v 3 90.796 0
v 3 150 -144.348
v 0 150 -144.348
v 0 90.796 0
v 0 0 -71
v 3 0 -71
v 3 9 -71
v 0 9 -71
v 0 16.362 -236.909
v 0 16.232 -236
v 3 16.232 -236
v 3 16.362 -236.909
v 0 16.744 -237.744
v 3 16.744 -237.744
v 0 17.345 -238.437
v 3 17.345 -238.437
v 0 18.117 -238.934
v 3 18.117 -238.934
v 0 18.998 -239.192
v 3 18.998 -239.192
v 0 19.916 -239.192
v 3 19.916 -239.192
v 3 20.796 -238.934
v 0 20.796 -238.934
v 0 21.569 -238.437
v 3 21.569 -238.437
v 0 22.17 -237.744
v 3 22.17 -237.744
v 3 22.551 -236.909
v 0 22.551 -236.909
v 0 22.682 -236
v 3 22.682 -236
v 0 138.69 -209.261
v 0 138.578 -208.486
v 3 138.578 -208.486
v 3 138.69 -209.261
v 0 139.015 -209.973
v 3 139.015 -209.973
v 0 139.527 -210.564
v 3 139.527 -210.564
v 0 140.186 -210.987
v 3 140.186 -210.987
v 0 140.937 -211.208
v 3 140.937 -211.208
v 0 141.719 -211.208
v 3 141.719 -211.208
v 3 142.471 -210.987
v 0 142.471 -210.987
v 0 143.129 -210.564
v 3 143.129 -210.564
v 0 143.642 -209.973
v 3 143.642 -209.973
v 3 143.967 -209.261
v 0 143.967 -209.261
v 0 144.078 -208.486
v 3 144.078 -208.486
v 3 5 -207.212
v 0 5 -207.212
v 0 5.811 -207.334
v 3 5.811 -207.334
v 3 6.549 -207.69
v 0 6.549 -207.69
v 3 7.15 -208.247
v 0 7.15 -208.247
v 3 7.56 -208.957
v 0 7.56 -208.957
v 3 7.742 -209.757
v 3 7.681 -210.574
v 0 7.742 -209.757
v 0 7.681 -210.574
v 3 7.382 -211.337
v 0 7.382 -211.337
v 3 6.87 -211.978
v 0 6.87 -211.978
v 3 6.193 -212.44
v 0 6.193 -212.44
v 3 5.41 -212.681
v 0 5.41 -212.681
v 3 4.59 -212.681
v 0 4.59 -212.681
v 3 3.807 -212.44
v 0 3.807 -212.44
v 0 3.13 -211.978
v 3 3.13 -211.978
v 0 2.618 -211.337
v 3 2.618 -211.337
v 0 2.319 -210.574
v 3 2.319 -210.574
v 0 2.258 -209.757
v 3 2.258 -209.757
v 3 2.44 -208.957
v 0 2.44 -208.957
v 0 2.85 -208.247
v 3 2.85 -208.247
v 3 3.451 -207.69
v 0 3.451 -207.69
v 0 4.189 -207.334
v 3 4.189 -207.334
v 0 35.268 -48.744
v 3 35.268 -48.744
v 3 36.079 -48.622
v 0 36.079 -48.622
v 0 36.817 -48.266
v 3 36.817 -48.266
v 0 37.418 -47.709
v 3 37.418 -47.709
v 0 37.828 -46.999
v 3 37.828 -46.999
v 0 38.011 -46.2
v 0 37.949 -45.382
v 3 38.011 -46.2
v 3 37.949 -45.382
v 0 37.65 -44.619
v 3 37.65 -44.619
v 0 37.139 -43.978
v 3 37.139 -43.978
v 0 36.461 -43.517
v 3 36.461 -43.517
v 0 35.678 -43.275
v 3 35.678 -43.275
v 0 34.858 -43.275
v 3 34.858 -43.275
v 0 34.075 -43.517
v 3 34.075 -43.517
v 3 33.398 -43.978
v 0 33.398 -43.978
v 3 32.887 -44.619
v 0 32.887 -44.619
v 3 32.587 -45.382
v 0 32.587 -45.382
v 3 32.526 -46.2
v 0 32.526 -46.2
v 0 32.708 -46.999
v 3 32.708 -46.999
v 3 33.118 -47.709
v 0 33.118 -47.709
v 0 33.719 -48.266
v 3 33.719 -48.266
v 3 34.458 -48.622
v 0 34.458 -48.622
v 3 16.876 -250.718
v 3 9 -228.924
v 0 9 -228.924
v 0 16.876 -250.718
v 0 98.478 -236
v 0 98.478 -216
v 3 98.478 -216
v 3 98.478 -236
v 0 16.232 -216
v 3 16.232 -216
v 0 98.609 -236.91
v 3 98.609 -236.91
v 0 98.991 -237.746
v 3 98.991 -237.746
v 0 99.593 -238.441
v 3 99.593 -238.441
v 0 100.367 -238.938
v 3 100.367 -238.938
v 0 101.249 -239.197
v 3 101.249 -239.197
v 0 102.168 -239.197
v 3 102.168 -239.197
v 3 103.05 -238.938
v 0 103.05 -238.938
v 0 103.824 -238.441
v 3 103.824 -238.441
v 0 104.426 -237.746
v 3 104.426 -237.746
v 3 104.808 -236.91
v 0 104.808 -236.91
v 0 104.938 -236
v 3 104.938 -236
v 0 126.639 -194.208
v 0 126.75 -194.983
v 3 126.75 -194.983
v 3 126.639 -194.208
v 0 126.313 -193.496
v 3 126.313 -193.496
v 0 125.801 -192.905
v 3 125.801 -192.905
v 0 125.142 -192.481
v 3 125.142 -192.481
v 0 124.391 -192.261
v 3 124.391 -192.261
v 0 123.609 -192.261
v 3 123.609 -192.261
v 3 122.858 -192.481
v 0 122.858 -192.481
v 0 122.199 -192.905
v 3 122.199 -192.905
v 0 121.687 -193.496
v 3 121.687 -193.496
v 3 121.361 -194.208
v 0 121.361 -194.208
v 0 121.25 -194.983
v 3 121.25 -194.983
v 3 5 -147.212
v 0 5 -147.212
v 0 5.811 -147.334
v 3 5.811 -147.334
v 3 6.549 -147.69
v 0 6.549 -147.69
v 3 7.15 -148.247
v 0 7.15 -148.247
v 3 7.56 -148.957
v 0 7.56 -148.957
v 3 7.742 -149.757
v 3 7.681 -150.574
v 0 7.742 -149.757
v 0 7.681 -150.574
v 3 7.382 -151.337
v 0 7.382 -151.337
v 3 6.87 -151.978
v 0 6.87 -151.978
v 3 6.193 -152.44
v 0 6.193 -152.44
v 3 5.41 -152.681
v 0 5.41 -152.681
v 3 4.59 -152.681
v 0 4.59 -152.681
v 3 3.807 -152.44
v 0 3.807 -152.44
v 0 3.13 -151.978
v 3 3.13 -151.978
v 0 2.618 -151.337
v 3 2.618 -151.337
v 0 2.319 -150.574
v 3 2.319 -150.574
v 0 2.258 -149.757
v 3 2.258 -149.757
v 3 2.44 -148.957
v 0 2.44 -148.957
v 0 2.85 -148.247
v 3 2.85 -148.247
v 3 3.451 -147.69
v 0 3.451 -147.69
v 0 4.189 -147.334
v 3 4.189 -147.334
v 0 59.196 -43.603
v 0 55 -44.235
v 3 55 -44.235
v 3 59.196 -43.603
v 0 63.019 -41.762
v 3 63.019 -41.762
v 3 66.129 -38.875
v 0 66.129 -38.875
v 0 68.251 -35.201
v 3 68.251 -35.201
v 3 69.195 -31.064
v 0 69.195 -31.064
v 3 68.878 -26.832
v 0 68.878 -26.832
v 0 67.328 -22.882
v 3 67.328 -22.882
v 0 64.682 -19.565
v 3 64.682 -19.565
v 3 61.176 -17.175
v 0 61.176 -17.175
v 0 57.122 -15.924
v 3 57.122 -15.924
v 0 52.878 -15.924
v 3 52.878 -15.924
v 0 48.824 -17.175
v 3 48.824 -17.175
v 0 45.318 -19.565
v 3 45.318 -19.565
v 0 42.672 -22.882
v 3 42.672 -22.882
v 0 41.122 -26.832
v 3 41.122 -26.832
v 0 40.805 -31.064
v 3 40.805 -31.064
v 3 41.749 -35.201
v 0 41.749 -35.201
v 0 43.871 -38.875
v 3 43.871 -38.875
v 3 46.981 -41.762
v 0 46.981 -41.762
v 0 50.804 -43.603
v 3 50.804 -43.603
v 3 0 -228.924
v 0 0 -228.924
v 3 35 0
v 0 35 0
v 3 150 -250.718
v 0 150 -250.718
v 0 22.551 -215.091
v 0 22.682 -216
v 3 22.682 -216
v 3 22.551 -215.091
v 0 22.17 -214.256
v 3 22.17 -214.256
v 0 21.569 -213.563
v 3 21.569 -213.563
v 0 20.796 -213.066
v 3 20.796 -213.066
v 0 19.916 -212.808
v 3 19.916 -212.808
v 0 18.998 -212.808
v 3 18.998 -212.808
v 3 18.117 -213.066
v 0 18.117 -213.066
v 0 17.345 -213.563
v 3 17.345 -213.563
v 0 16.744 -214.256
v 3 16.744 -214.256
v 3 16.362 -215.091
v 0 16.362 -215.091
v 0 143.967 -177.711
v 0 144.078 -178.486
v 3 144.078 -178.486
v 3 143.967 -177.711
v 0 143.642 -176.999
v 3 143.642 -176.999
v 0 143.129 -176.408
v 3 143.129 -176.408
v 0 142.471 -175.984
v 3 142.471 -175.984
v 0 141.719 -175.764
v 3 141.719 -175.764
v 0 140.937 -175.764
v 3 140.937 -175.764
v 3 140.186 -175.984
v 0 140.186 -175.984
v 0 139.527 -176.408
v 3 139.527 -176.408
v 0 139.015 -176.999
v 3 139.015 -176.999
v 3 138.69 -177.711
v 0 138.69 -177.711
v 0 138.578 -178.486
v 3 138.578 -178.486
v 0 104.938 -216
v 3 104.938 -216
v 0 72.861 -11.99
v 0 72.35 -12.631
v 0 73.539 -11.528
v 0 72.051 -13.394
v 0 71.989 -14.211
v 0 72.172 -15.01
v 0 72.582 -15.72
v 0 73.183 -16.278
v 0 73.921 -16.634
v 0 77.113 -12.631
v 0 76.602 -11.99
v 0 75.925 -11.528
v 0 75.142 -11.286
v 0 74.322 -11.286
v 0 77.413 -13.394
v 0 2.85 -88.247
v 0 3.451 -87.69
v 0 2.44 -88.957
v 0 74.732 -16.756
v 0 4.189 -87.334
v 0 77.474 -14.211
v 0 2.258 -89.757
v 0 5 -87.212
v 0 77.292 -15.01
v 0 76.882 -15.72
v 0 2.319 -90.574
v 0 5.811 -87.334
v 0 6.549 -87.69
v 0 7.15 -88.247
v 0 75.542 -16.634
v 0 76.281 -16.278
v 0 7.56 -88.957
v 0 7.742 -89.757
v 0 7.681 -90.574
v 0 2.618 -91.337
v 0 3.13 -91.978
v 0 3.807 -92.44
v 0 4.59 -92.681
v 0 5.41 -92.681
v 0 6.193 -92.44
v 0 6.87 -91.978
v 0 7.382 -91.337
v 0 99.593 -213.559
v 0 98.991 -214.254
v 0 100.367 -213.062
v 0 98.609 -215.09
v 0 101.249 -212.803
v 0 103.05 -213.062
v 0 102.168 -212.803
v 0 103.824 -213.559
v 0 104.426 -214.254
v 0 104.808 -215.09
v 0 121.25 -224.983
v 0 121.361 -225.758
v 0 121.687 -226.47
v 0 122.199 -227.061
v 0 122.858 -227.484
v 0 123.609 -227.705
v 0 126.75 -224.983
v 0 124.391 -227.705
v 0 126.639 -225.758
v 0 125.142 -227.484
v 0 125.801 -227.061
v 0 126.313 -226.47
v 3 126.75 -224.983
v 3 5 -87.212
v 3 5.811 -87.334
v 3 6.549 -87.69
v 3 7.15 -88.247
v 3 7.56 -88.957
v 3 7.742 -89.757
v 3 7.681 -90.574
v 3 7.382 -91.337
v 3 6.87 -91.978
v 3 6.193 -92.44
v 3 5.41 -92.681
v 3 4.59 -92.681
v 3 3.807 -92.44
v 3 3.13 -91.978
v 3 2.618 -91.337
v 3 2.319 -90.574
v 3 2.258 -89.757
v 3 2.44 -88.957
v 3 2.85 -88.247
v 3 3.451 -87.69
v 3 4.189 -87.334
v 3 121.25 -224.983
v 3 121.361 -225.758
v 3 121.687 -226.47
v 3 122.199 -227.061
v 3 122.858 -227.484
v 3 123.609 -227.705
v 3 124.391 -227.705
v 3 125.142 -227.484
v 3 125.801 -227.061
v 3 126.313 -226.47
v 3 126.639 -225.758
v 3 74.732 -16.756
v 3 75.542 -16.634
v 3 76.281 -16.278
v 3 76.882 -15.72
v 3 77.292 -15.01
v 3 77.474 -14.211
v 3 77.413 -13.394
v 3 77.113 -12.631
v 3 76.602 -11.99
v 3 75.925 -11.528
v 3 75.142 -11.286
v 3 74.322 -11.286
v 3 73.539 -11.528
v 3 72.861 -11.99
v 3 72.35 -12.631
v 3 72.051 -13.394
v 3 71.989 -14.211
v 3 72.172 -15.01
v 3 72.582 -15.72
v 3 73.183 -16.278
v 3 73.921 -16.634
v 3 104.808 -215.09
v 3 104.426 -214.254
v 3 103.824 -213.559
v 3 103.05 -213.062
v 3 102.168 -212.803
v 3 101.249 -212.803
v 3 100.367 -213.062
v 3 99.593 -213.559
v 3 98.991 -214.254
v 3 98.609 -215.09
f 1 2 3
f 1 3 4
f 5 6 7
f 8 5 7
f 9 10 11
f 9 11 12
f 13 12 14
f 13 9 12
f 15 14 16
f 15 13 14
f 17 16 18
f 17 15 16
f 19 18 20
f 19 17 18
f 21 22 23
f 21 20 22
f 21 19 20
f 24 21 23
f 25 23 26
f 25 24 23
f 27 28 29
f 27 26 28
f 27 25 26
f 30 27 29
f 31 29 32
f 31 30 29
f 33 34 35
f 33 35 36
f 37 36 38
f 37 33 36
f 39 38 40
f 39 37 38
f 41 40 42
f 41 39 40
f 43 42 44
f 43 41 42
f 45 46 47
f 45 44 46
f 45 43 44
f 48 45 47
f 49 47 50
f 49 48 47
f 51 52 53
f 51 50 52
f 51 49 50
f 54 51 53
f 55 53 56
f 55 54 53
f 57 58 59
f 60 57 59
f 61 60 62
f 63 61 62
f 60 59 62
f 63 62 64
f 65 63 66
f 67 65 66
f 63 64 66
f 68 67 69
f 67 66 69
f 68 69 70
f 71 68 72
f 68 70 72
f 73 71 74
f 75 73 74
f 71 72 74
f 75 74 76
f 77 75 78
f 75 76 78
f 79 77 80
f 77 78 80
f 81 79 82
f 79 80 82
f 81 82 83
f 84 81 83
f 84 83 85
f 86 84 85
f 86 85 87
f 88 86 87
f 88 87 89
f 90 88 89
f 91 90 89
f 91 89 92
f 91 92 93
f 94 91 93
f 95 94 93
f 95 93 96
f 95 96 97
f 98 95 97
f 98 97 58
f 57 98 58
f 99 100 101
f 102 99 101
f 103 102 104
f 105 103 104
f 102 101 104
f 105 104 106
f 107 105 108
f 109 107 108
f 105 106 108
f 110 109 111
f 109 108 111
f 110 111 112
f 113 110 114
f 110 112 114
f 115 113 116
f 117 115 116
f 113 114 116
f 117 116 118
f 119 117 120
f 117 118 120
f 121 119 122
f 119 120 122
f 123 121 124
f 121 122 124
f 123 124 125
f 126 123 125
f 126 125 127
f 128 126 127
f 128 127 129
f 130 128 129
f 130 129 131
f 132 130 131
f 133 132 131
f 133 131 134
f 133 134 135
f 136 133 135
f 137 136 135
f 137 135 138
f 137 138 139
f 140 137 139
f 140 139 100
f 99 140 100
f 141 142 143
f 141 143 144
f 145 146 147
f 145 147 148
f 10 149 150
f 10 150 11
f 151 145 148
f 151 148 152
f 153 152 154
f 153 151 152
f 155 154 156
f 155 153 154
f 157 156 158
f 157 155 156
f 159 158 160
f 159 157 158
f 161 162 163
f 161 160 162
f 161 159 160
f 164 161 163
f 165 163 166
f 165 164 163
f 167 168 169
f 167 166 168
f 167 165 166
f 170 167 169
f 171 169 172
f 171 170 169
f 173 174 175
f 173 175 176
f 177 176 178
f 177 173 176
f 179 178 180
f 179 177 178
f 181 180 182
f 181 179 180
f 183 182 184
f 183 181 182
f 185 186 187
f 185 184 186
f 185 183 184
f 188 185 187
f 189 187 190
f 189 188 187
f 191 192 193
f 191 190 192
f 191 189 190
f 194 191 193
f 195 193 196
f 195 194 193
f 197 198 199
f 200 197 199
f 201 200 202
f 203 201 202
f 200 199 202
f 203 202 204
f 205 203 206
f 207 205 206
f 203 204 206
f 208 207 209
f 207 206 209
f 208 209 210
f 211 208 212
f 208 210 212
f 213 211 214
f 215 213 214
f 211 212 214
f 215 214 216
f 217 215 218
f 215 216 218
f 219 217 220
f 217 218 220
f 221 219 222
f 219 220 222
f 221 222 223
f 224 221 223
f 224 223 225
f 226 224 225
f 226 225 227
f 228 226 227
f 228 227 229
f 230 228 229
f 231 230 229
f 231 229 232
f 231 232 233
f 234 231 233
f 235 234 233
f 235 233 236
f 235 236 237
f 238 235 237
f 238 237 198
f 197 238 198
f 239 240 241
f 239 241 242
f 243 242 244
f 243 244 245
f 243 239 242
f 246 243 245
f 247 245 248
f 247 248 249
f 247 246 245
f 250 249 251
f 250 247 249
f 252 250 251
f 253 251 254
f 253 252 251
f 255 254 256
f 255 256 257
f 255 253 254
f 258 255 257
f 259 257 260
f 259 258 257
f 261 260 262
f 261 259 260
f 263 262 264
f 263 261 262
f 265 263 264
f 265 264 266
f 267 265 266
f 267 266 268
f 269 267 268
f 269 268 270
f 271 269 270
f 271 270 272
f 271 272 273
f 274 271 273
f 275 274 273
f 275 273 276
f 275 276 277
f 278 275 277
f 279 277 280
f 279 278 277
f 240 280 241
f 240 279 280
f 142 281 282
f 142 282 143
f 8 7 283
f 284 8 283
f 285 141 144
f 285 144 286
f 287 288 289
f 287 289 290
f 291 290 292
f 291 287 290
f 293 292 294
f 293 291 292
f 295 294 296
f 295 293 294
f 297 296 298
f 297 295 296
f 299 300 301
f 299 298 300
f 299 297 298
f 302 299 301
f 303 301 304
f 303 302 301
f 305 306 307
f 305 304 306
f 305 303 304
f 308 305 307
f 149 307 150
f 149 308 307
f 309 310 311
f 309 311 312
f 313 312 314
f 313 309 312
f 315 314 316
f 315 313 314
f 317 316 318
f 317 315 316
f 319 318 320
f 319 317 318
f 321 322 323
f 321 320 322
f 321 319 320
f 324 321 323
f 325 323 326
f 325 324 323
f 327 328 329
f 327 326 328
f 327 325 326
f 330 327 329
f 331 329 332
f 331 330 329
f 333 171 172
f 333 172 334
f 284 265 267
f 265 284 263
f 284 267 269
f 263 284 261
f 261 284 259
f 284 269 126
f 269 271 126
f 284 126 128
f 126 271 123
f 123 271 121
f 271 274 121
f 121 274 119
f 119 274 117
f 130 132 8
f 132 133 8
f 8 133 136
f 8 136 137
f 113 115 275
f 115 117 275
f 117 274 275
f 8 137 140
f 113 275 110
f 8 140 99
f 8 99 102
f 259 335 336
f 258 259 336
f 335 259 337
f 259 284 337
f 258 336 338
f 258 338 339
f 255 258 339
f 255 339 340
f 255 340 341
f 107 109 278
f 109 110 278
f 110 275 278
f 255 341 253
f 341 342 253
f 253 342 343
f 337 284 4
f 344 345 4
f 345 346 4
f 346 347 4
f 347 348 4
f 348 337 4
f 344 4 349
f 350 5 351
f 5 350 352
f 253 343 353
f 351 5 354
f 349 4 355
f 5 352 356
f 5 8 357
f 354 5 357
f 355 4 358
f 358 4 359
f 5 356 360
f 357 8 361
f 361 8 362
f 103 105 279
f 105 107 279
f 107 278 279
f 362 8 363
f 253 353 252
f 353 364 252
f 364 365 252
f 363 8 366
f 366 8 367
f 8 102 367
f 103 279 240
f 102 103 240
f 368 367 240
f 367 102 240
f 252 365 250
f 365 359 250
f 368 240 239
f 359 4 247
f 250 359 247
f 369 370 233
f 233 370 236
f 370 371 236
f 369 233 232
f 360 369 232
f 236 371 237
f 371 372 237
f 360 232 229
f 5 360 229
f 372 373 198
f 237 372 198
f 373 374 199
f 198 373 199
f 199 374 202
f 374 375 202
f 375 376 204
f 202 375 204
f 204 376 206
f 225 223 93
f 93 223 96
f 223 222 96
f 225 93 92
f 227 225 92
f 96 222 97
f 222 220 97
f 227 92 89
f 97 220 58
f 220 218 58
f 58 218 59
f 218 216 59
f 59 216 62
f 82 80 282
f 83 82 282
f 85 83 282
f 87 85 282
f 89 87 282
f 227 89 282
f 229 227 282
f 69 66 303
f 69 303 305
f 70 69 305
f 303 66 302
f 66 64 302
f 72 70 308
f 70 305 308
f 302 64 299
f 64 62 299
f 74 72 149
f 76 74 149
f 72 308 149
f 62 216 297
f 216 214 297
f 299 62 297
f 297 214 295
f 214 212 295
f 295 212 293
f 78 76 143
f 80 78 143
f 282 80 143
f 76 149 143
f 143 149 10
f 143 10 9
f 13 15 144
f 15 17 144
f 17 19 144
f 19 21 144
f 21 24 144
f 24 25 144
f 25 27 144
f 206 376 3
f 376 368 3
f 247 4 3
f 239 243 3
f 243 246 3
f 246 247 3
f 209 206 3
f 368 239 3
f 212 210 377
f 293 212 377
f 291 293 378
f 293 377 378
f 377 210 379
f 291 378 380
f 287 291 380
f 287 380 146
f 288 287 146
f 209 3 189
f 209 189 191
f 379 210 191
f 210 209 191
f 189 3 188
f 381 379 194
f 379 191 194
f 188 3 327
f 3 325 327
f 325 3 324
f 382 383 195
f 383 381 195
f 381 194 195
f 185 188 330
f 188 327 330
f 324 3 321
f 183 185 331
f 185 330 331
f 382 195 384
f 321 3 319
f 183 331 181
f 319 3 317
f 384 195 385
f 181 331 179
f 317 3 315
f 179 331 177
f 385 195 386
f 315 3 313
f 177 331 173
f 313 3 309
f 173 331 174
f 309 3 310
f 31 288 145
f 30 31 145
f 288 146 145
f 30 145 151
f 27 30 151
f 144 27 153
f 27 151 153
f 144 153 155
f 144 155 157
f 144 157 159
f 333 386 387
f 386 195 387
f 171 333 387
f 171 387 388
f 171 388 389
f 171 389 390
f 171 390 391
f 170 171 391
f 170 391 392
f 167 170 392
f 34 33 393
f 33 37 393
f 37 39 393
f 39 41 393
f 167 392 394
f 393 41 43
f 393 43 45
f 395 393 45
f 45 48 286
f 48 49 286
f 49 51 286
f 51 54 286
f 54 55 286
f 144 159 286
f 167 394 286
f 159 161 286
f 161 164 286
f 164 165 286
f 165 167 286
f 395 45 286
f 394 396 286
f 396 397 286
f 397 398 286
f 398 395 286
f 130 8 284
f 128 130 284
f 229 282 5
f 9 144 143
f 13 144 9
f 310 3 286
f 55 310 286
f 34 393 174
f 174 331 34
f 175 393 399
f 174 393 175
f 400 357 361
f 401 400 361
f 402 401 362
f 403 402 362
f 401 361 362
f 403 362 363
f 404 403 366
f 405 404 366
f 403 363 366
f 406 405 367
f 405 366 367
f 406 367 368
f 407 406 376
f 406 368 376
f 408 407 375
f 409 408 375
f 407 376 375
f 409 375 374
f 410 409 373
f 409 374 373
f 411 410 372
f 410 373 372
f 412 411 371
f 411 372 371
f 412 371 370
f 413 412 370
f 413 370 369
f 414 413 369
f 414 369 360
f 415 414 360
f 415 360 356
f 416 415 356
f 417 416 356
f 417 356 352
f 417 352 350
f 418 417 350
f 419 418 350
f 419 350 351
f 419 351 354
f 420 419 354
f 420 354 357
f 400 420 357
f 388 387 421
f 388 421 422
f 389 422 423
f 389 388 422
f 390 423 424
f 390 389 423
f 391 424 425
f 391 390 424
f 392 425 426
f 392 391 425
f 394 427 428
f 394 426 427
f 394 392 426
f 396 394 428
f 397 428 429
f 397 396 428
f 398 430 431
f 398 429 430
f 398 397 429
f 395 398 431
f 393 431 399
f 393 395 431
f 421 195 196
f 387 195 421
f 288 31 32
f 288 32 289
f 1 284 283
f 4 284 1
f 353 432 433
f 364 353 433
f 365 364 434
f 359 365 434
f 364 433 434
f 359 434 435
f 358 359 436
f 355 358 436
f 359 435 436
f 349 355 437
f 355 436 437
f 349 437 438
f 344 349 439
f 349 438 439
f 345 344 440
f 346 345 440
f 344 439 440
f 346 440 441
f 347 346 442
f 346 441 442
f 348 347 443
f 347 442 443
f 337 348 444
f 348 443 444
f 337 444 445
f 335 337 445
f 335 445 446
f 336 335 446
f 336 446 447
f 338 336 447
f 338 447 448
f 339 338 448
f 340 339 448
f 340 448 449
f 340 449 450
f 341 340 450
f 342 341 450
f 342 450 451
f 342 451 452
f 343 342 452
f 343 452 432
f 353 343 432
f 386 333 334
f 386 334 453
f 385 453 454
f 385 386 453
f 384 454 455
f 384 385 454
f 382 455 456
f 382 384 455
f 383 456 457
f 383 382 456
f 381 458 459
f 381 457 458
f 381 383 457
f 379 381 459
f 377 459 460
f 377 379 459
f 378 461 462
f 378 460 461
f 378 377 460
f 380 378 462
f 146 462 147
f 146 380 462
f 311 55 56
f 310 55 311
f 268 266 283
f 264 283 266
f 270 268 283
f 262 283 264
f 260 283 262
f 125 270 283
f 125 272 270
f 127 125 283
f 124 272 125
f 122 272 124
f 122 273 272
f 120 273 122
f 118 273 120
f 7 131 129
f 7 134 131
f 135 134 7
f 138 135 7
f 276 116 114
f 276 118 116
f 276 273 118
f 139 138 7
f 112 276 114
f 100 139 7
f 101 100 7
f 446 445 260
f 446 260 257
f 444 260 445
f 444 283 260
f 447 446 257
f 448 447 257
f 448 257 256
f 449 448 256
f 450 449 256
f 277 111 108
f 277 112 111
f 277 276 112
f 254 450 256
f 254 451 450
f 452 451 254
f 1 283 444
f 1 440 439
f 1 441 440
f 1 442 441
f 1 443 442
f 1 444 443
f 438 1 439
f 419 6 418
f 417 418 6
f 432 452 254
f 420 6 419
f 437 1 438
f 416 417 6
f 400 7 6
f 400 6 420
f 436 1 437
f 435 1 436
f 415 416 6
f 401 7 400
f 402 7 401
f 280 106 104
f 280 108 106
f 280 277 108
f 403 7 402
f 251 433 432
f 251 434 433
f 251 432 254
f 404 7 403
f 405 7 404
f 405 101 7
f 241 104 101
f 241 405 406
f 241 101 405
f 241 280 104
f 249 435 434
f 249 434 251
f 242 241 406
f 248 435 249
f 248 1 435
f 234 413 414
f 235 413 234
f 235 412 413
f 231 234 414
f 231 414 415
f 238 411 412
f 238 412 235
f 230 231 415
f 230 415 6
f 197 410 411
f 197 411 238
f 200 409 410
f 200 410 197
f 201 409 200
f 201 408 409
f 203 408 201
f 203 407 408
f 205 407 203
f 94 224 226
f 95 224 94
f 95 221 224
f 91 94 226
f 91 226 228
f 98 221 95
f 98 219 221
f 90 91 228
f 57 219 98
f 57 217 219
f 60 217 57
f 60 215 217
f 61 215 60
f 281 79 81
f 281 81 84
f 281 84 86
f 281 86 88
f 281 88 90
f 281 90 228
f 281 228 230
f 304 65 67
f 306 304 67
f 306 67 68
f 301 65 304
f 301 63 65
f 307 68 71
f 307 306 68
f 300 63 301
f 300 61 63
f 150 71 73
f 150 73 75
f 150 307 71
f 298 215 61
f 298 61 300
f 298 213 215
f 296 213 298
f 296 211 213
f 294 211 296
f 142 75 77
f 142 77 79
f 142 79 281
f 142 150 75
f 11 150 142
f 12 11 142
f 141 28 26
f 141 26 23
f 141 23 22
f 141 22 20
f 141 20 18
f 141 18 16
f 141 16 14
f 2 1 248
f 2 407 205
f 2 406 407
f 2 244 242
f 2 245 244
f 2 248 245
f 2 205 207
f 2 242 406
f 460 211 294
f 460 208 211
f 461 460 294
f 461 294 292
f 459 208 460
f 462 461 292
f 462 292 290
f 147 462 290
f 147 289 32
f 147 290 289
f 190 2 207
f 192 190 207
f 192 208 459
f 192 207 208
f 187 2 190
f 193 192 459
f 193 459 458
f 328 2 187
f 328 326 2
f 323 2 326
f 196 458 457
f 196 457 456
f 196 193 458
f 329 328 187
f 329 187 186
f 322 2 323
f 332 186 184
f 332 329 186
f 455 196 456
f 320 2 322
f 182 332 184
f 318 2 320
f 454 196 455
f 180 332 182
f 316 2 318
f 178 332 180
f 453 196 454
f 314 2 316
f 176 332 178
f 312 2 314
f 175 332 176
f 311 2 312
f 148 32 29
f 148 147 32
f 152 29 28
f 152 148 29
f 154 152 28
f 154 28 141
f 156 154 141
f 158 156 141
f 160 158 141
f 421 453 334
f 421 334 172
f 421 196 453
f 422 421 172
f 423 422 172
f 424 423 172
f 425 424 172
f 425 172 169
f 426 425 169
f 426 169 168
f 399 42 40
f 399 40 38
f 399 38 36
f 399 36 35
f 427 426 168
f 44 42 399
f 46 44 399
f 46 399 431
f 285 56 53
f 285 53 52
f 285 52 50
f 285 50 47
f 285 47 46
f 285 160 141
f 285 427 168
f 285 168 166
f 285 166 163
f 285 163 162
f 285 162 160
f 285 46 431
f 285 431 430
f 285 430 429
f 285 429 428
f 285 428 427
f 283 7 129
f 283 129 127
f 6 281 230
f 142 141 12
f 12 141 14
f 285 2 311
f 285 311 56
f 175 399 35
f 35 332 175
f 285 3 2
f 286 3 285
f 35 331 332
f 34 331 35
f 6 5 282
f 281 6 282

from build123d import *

# Parameters (mm, degrees)
SKETCH1_W           = 300
SKETCH1_H           = 150
SKETCH1_R           = 14.235
BOSS_EXTRUDE1_DEPTH = 3
CUT_EXTRUDE1_REACH  = 5
SKETCH2_R           = 3.225
SKETCH3_R           = 2.75
CUT_EXTRUDE2_DEPTH  = 4
CUT_EXTRUDE3_DEPTH  = 4
CUT_EXTRUDE4_DEPTH  = 10
CUT_EXTRUDE5_DEPTH  = 10
SKETCH7_R           = 2.75
CUT_EXTRUDE6_DEPTH  = 4
CUT_EXTRUDE7_DEPTH  = 10


with BuildPart() as part:
    # Sketch1 → Boss-Extrude1 (new body)
    with BuildSketch(Plane(origin=(0, 0, 0), x_dir=(0, 0, -1), z_dir=(1, 0, 0))):
        with Locations((150, 75)):
            Rectangle(SKETCH1_W, SKETCH1_H)
        with Locations((30, 55)):
            Circle(SKETCH1_R, mode=Mode.SUBTRACT)
    extrude(amount=BOSS_EXTRUDE1_DEPTH)

    # Sketch2 → Cut-Extrude1 (cut, up to next)
    with BuildSketch(Plane.ZY, mode=Mode.PRIVATE) as cut_extrude1_sk1:
        with Locations((-10, 110)):
            Circle(SKETCH2_R)
    cut_extrude1_tool1 = extrude(cut_extrude1_sk1.sketch, amount=-CUT_EXTRUDE1_REACH, mode=Mode.PRIVATE) & part.part
    add(cut_extrude1_tool1.solids().sort_by_distance((0, 110, -10))[0], mode=Mode.SUBTRACT)
    # Sketch2 → Cut-Extrude1 (cut, up to next)
    with BuildSketch(Plane.ZY, mode=Mode.PRIVATE) as cut_extrude1_sk2:
        with BuildLine():
            Line((-216, 98.478413591), (-236, 98.478413591))
            ThreePointArc((-236, 98.478413591), (-239.23, 101.708413591), (-236, 104.938413591))
            Line((-236, 104.938413591), (-216, 104.938413591))
            ThreePointArc((-216, 104.938413591), (-212.77, 101.708413591), (-216, 98.478413591))
        make_face()
    cut_extrude1_tool2 = extrude(cut_extrude1_sk2.sketch, amount=-CUT_EXTRUDE1_REACH, mode=Mode.PRIVATE) & part.part
    add(cut_extrude1_tool2.solids().sort_by_distance((0, 101.708414, -226))[0], mode=Mode.SUBTRACT)
    # Sketch2 → Cut-Extrude1 (cut, up to next)
    with BuildSketch(Plane.ZY, mode=Mode.PRIVATE) as cut_extrude1_sk3:
        with BuildLine():
            Line((-236, 22.681694356), (-216, 22.681694356))
            ThreePointArc((-216, 22.681694356), (-212.775, 19.456694356), (-216, 16.231694356))
            Line((-216, 16.231694356), (-236, 16.231694356))
            ThreePointArc((-236, 16.231694356), (-239.225, 19.456694356), (-236, 22.681694356))
        make_face()
    cut_extrude1_tool3 = extrude(cut_extrude1_sk3.sketch, amount=-CUT_EXTRUDE1_REACH, mode=Mode.PRIVATE) & part.part
    add(cut_extrude1_tool3.solids().sort_by_distance((0, 19.456694, -226))[0], mode=Mode.SUBTRACT)

    # Sketch3 → Cut-Extrude2 (cut, through all)
    with BuildSketch(Plane(origin=(3, 0, 0), x_dir=(0, 0, -1), z_dir=(1, 0, 0))):
        with Locations((14.005743185, 74.73179538)):
            Circle(SKETCH3_R)
        with Locations((45.994256815, 35.26820462)):
            Circle(SKETCH3_R)
    extrude(amount=-CUT_EXTRUDE2_DEPTH, mode=Mode.SUBTRACT)

    # Sketch4 → Cut-Extrude3 (cut, through all)
    with BuildSketch(Plane(origin=(3, 0, 0), x_dir=(0, 0, -1), z_dir=(1, 0, 0))):
        Polygon((71, 9), (0, 35), (0, 0), (71, 0), align=None)
    extrude(amount=-CUT_EXTRUDE3_DEPTH, mode=Mode.SUBTRACT)

    # Sketch5 → Cut-Extrude4 (cut)
    with BuildSketch(Plane(origin=(3, 0, 0), x_dir=(0, 0, -1), z_dir=(1, 0, 0))):
        Polygon((228.92403237, 9), (250.717958721, 16.875947155), (250.717958721, 150), (312.660420977, 150), (312.660420977, -2.829604392), (228.92403237, 0), align=None)
    extrude(amount=-CUT_EXTRUDE4_DEPTH, mode=Mode.SUBTRACT)

    # Sketch6 → Cut-Extrude5 (cut)
    with BuildSketch(Plane(origin=(3, 0, 0), x_dir=(0, 0, -1), z_dir=(1, 0, 0))):
        Polygon((146.165756513, 150.745674322), (0, 90.796268719), (-32.55366639, 170.167051921), align=None)
    extrude(amount=-CUT_EXTRUDE5_DEPTH, mode=Mode.SUBTRACT)

    # Sketch7 → Cut-Extrude6 (cut, through all)
    with BuildSketch(Plane.ZY):
        with Locations((-209.962016185, 5)):
            Circle(SKETCH7_R)
        with Locations((-149.962016185, 5)):
            Circle(SKETCH7_R)
        with Locations((-89.962016185, 5)):
            Circle(SKETCH7_R)
    extrude(amount=-CUT_EXTRUDE6_DEPTH, mode=Mode.SUBTRACT)

    # Sketch8 → Cut-Extrude7 (cut)
    with BuildSketch(Plane.ZY):
        with BuildLine():
            Line((-208.485850147, 144.07811147), (-178.485850147, 144.07811147))
            ThreePointArc((-178.485850147, 144.07811147), (-175.735850147, 141.32811147), (-178.485850147, 138.57811147))
            Line((-178.485850147, 138.57811147), (-208.485850147, 138.57811147))
            ThreePointArc((-208.485850147, 138.57811147), (-211.235850147, 141.32811147), (-208.485850147, 144.07811147))
        make_face()
        with BuildLine():
            Line((-224.982842506, 126.75), (-194.982842506, 126.75))
            ThreePointArc((-194.982842506, 126.75), (-192.232842506, 124), (-194.982842506, 121.25))
            Line((-194.982842506, 121.25), (-224.982842506, 121.25))
            ThreePointArc((-224.982842506, 121.25), (-227.732842506, 124), (-224.982842506, 126.75))
        make_face()
    extrude(amount=-CUT_EXTRUDE7_DEPTH, mode=Mode.SUBTRACT)


solid = part.part
